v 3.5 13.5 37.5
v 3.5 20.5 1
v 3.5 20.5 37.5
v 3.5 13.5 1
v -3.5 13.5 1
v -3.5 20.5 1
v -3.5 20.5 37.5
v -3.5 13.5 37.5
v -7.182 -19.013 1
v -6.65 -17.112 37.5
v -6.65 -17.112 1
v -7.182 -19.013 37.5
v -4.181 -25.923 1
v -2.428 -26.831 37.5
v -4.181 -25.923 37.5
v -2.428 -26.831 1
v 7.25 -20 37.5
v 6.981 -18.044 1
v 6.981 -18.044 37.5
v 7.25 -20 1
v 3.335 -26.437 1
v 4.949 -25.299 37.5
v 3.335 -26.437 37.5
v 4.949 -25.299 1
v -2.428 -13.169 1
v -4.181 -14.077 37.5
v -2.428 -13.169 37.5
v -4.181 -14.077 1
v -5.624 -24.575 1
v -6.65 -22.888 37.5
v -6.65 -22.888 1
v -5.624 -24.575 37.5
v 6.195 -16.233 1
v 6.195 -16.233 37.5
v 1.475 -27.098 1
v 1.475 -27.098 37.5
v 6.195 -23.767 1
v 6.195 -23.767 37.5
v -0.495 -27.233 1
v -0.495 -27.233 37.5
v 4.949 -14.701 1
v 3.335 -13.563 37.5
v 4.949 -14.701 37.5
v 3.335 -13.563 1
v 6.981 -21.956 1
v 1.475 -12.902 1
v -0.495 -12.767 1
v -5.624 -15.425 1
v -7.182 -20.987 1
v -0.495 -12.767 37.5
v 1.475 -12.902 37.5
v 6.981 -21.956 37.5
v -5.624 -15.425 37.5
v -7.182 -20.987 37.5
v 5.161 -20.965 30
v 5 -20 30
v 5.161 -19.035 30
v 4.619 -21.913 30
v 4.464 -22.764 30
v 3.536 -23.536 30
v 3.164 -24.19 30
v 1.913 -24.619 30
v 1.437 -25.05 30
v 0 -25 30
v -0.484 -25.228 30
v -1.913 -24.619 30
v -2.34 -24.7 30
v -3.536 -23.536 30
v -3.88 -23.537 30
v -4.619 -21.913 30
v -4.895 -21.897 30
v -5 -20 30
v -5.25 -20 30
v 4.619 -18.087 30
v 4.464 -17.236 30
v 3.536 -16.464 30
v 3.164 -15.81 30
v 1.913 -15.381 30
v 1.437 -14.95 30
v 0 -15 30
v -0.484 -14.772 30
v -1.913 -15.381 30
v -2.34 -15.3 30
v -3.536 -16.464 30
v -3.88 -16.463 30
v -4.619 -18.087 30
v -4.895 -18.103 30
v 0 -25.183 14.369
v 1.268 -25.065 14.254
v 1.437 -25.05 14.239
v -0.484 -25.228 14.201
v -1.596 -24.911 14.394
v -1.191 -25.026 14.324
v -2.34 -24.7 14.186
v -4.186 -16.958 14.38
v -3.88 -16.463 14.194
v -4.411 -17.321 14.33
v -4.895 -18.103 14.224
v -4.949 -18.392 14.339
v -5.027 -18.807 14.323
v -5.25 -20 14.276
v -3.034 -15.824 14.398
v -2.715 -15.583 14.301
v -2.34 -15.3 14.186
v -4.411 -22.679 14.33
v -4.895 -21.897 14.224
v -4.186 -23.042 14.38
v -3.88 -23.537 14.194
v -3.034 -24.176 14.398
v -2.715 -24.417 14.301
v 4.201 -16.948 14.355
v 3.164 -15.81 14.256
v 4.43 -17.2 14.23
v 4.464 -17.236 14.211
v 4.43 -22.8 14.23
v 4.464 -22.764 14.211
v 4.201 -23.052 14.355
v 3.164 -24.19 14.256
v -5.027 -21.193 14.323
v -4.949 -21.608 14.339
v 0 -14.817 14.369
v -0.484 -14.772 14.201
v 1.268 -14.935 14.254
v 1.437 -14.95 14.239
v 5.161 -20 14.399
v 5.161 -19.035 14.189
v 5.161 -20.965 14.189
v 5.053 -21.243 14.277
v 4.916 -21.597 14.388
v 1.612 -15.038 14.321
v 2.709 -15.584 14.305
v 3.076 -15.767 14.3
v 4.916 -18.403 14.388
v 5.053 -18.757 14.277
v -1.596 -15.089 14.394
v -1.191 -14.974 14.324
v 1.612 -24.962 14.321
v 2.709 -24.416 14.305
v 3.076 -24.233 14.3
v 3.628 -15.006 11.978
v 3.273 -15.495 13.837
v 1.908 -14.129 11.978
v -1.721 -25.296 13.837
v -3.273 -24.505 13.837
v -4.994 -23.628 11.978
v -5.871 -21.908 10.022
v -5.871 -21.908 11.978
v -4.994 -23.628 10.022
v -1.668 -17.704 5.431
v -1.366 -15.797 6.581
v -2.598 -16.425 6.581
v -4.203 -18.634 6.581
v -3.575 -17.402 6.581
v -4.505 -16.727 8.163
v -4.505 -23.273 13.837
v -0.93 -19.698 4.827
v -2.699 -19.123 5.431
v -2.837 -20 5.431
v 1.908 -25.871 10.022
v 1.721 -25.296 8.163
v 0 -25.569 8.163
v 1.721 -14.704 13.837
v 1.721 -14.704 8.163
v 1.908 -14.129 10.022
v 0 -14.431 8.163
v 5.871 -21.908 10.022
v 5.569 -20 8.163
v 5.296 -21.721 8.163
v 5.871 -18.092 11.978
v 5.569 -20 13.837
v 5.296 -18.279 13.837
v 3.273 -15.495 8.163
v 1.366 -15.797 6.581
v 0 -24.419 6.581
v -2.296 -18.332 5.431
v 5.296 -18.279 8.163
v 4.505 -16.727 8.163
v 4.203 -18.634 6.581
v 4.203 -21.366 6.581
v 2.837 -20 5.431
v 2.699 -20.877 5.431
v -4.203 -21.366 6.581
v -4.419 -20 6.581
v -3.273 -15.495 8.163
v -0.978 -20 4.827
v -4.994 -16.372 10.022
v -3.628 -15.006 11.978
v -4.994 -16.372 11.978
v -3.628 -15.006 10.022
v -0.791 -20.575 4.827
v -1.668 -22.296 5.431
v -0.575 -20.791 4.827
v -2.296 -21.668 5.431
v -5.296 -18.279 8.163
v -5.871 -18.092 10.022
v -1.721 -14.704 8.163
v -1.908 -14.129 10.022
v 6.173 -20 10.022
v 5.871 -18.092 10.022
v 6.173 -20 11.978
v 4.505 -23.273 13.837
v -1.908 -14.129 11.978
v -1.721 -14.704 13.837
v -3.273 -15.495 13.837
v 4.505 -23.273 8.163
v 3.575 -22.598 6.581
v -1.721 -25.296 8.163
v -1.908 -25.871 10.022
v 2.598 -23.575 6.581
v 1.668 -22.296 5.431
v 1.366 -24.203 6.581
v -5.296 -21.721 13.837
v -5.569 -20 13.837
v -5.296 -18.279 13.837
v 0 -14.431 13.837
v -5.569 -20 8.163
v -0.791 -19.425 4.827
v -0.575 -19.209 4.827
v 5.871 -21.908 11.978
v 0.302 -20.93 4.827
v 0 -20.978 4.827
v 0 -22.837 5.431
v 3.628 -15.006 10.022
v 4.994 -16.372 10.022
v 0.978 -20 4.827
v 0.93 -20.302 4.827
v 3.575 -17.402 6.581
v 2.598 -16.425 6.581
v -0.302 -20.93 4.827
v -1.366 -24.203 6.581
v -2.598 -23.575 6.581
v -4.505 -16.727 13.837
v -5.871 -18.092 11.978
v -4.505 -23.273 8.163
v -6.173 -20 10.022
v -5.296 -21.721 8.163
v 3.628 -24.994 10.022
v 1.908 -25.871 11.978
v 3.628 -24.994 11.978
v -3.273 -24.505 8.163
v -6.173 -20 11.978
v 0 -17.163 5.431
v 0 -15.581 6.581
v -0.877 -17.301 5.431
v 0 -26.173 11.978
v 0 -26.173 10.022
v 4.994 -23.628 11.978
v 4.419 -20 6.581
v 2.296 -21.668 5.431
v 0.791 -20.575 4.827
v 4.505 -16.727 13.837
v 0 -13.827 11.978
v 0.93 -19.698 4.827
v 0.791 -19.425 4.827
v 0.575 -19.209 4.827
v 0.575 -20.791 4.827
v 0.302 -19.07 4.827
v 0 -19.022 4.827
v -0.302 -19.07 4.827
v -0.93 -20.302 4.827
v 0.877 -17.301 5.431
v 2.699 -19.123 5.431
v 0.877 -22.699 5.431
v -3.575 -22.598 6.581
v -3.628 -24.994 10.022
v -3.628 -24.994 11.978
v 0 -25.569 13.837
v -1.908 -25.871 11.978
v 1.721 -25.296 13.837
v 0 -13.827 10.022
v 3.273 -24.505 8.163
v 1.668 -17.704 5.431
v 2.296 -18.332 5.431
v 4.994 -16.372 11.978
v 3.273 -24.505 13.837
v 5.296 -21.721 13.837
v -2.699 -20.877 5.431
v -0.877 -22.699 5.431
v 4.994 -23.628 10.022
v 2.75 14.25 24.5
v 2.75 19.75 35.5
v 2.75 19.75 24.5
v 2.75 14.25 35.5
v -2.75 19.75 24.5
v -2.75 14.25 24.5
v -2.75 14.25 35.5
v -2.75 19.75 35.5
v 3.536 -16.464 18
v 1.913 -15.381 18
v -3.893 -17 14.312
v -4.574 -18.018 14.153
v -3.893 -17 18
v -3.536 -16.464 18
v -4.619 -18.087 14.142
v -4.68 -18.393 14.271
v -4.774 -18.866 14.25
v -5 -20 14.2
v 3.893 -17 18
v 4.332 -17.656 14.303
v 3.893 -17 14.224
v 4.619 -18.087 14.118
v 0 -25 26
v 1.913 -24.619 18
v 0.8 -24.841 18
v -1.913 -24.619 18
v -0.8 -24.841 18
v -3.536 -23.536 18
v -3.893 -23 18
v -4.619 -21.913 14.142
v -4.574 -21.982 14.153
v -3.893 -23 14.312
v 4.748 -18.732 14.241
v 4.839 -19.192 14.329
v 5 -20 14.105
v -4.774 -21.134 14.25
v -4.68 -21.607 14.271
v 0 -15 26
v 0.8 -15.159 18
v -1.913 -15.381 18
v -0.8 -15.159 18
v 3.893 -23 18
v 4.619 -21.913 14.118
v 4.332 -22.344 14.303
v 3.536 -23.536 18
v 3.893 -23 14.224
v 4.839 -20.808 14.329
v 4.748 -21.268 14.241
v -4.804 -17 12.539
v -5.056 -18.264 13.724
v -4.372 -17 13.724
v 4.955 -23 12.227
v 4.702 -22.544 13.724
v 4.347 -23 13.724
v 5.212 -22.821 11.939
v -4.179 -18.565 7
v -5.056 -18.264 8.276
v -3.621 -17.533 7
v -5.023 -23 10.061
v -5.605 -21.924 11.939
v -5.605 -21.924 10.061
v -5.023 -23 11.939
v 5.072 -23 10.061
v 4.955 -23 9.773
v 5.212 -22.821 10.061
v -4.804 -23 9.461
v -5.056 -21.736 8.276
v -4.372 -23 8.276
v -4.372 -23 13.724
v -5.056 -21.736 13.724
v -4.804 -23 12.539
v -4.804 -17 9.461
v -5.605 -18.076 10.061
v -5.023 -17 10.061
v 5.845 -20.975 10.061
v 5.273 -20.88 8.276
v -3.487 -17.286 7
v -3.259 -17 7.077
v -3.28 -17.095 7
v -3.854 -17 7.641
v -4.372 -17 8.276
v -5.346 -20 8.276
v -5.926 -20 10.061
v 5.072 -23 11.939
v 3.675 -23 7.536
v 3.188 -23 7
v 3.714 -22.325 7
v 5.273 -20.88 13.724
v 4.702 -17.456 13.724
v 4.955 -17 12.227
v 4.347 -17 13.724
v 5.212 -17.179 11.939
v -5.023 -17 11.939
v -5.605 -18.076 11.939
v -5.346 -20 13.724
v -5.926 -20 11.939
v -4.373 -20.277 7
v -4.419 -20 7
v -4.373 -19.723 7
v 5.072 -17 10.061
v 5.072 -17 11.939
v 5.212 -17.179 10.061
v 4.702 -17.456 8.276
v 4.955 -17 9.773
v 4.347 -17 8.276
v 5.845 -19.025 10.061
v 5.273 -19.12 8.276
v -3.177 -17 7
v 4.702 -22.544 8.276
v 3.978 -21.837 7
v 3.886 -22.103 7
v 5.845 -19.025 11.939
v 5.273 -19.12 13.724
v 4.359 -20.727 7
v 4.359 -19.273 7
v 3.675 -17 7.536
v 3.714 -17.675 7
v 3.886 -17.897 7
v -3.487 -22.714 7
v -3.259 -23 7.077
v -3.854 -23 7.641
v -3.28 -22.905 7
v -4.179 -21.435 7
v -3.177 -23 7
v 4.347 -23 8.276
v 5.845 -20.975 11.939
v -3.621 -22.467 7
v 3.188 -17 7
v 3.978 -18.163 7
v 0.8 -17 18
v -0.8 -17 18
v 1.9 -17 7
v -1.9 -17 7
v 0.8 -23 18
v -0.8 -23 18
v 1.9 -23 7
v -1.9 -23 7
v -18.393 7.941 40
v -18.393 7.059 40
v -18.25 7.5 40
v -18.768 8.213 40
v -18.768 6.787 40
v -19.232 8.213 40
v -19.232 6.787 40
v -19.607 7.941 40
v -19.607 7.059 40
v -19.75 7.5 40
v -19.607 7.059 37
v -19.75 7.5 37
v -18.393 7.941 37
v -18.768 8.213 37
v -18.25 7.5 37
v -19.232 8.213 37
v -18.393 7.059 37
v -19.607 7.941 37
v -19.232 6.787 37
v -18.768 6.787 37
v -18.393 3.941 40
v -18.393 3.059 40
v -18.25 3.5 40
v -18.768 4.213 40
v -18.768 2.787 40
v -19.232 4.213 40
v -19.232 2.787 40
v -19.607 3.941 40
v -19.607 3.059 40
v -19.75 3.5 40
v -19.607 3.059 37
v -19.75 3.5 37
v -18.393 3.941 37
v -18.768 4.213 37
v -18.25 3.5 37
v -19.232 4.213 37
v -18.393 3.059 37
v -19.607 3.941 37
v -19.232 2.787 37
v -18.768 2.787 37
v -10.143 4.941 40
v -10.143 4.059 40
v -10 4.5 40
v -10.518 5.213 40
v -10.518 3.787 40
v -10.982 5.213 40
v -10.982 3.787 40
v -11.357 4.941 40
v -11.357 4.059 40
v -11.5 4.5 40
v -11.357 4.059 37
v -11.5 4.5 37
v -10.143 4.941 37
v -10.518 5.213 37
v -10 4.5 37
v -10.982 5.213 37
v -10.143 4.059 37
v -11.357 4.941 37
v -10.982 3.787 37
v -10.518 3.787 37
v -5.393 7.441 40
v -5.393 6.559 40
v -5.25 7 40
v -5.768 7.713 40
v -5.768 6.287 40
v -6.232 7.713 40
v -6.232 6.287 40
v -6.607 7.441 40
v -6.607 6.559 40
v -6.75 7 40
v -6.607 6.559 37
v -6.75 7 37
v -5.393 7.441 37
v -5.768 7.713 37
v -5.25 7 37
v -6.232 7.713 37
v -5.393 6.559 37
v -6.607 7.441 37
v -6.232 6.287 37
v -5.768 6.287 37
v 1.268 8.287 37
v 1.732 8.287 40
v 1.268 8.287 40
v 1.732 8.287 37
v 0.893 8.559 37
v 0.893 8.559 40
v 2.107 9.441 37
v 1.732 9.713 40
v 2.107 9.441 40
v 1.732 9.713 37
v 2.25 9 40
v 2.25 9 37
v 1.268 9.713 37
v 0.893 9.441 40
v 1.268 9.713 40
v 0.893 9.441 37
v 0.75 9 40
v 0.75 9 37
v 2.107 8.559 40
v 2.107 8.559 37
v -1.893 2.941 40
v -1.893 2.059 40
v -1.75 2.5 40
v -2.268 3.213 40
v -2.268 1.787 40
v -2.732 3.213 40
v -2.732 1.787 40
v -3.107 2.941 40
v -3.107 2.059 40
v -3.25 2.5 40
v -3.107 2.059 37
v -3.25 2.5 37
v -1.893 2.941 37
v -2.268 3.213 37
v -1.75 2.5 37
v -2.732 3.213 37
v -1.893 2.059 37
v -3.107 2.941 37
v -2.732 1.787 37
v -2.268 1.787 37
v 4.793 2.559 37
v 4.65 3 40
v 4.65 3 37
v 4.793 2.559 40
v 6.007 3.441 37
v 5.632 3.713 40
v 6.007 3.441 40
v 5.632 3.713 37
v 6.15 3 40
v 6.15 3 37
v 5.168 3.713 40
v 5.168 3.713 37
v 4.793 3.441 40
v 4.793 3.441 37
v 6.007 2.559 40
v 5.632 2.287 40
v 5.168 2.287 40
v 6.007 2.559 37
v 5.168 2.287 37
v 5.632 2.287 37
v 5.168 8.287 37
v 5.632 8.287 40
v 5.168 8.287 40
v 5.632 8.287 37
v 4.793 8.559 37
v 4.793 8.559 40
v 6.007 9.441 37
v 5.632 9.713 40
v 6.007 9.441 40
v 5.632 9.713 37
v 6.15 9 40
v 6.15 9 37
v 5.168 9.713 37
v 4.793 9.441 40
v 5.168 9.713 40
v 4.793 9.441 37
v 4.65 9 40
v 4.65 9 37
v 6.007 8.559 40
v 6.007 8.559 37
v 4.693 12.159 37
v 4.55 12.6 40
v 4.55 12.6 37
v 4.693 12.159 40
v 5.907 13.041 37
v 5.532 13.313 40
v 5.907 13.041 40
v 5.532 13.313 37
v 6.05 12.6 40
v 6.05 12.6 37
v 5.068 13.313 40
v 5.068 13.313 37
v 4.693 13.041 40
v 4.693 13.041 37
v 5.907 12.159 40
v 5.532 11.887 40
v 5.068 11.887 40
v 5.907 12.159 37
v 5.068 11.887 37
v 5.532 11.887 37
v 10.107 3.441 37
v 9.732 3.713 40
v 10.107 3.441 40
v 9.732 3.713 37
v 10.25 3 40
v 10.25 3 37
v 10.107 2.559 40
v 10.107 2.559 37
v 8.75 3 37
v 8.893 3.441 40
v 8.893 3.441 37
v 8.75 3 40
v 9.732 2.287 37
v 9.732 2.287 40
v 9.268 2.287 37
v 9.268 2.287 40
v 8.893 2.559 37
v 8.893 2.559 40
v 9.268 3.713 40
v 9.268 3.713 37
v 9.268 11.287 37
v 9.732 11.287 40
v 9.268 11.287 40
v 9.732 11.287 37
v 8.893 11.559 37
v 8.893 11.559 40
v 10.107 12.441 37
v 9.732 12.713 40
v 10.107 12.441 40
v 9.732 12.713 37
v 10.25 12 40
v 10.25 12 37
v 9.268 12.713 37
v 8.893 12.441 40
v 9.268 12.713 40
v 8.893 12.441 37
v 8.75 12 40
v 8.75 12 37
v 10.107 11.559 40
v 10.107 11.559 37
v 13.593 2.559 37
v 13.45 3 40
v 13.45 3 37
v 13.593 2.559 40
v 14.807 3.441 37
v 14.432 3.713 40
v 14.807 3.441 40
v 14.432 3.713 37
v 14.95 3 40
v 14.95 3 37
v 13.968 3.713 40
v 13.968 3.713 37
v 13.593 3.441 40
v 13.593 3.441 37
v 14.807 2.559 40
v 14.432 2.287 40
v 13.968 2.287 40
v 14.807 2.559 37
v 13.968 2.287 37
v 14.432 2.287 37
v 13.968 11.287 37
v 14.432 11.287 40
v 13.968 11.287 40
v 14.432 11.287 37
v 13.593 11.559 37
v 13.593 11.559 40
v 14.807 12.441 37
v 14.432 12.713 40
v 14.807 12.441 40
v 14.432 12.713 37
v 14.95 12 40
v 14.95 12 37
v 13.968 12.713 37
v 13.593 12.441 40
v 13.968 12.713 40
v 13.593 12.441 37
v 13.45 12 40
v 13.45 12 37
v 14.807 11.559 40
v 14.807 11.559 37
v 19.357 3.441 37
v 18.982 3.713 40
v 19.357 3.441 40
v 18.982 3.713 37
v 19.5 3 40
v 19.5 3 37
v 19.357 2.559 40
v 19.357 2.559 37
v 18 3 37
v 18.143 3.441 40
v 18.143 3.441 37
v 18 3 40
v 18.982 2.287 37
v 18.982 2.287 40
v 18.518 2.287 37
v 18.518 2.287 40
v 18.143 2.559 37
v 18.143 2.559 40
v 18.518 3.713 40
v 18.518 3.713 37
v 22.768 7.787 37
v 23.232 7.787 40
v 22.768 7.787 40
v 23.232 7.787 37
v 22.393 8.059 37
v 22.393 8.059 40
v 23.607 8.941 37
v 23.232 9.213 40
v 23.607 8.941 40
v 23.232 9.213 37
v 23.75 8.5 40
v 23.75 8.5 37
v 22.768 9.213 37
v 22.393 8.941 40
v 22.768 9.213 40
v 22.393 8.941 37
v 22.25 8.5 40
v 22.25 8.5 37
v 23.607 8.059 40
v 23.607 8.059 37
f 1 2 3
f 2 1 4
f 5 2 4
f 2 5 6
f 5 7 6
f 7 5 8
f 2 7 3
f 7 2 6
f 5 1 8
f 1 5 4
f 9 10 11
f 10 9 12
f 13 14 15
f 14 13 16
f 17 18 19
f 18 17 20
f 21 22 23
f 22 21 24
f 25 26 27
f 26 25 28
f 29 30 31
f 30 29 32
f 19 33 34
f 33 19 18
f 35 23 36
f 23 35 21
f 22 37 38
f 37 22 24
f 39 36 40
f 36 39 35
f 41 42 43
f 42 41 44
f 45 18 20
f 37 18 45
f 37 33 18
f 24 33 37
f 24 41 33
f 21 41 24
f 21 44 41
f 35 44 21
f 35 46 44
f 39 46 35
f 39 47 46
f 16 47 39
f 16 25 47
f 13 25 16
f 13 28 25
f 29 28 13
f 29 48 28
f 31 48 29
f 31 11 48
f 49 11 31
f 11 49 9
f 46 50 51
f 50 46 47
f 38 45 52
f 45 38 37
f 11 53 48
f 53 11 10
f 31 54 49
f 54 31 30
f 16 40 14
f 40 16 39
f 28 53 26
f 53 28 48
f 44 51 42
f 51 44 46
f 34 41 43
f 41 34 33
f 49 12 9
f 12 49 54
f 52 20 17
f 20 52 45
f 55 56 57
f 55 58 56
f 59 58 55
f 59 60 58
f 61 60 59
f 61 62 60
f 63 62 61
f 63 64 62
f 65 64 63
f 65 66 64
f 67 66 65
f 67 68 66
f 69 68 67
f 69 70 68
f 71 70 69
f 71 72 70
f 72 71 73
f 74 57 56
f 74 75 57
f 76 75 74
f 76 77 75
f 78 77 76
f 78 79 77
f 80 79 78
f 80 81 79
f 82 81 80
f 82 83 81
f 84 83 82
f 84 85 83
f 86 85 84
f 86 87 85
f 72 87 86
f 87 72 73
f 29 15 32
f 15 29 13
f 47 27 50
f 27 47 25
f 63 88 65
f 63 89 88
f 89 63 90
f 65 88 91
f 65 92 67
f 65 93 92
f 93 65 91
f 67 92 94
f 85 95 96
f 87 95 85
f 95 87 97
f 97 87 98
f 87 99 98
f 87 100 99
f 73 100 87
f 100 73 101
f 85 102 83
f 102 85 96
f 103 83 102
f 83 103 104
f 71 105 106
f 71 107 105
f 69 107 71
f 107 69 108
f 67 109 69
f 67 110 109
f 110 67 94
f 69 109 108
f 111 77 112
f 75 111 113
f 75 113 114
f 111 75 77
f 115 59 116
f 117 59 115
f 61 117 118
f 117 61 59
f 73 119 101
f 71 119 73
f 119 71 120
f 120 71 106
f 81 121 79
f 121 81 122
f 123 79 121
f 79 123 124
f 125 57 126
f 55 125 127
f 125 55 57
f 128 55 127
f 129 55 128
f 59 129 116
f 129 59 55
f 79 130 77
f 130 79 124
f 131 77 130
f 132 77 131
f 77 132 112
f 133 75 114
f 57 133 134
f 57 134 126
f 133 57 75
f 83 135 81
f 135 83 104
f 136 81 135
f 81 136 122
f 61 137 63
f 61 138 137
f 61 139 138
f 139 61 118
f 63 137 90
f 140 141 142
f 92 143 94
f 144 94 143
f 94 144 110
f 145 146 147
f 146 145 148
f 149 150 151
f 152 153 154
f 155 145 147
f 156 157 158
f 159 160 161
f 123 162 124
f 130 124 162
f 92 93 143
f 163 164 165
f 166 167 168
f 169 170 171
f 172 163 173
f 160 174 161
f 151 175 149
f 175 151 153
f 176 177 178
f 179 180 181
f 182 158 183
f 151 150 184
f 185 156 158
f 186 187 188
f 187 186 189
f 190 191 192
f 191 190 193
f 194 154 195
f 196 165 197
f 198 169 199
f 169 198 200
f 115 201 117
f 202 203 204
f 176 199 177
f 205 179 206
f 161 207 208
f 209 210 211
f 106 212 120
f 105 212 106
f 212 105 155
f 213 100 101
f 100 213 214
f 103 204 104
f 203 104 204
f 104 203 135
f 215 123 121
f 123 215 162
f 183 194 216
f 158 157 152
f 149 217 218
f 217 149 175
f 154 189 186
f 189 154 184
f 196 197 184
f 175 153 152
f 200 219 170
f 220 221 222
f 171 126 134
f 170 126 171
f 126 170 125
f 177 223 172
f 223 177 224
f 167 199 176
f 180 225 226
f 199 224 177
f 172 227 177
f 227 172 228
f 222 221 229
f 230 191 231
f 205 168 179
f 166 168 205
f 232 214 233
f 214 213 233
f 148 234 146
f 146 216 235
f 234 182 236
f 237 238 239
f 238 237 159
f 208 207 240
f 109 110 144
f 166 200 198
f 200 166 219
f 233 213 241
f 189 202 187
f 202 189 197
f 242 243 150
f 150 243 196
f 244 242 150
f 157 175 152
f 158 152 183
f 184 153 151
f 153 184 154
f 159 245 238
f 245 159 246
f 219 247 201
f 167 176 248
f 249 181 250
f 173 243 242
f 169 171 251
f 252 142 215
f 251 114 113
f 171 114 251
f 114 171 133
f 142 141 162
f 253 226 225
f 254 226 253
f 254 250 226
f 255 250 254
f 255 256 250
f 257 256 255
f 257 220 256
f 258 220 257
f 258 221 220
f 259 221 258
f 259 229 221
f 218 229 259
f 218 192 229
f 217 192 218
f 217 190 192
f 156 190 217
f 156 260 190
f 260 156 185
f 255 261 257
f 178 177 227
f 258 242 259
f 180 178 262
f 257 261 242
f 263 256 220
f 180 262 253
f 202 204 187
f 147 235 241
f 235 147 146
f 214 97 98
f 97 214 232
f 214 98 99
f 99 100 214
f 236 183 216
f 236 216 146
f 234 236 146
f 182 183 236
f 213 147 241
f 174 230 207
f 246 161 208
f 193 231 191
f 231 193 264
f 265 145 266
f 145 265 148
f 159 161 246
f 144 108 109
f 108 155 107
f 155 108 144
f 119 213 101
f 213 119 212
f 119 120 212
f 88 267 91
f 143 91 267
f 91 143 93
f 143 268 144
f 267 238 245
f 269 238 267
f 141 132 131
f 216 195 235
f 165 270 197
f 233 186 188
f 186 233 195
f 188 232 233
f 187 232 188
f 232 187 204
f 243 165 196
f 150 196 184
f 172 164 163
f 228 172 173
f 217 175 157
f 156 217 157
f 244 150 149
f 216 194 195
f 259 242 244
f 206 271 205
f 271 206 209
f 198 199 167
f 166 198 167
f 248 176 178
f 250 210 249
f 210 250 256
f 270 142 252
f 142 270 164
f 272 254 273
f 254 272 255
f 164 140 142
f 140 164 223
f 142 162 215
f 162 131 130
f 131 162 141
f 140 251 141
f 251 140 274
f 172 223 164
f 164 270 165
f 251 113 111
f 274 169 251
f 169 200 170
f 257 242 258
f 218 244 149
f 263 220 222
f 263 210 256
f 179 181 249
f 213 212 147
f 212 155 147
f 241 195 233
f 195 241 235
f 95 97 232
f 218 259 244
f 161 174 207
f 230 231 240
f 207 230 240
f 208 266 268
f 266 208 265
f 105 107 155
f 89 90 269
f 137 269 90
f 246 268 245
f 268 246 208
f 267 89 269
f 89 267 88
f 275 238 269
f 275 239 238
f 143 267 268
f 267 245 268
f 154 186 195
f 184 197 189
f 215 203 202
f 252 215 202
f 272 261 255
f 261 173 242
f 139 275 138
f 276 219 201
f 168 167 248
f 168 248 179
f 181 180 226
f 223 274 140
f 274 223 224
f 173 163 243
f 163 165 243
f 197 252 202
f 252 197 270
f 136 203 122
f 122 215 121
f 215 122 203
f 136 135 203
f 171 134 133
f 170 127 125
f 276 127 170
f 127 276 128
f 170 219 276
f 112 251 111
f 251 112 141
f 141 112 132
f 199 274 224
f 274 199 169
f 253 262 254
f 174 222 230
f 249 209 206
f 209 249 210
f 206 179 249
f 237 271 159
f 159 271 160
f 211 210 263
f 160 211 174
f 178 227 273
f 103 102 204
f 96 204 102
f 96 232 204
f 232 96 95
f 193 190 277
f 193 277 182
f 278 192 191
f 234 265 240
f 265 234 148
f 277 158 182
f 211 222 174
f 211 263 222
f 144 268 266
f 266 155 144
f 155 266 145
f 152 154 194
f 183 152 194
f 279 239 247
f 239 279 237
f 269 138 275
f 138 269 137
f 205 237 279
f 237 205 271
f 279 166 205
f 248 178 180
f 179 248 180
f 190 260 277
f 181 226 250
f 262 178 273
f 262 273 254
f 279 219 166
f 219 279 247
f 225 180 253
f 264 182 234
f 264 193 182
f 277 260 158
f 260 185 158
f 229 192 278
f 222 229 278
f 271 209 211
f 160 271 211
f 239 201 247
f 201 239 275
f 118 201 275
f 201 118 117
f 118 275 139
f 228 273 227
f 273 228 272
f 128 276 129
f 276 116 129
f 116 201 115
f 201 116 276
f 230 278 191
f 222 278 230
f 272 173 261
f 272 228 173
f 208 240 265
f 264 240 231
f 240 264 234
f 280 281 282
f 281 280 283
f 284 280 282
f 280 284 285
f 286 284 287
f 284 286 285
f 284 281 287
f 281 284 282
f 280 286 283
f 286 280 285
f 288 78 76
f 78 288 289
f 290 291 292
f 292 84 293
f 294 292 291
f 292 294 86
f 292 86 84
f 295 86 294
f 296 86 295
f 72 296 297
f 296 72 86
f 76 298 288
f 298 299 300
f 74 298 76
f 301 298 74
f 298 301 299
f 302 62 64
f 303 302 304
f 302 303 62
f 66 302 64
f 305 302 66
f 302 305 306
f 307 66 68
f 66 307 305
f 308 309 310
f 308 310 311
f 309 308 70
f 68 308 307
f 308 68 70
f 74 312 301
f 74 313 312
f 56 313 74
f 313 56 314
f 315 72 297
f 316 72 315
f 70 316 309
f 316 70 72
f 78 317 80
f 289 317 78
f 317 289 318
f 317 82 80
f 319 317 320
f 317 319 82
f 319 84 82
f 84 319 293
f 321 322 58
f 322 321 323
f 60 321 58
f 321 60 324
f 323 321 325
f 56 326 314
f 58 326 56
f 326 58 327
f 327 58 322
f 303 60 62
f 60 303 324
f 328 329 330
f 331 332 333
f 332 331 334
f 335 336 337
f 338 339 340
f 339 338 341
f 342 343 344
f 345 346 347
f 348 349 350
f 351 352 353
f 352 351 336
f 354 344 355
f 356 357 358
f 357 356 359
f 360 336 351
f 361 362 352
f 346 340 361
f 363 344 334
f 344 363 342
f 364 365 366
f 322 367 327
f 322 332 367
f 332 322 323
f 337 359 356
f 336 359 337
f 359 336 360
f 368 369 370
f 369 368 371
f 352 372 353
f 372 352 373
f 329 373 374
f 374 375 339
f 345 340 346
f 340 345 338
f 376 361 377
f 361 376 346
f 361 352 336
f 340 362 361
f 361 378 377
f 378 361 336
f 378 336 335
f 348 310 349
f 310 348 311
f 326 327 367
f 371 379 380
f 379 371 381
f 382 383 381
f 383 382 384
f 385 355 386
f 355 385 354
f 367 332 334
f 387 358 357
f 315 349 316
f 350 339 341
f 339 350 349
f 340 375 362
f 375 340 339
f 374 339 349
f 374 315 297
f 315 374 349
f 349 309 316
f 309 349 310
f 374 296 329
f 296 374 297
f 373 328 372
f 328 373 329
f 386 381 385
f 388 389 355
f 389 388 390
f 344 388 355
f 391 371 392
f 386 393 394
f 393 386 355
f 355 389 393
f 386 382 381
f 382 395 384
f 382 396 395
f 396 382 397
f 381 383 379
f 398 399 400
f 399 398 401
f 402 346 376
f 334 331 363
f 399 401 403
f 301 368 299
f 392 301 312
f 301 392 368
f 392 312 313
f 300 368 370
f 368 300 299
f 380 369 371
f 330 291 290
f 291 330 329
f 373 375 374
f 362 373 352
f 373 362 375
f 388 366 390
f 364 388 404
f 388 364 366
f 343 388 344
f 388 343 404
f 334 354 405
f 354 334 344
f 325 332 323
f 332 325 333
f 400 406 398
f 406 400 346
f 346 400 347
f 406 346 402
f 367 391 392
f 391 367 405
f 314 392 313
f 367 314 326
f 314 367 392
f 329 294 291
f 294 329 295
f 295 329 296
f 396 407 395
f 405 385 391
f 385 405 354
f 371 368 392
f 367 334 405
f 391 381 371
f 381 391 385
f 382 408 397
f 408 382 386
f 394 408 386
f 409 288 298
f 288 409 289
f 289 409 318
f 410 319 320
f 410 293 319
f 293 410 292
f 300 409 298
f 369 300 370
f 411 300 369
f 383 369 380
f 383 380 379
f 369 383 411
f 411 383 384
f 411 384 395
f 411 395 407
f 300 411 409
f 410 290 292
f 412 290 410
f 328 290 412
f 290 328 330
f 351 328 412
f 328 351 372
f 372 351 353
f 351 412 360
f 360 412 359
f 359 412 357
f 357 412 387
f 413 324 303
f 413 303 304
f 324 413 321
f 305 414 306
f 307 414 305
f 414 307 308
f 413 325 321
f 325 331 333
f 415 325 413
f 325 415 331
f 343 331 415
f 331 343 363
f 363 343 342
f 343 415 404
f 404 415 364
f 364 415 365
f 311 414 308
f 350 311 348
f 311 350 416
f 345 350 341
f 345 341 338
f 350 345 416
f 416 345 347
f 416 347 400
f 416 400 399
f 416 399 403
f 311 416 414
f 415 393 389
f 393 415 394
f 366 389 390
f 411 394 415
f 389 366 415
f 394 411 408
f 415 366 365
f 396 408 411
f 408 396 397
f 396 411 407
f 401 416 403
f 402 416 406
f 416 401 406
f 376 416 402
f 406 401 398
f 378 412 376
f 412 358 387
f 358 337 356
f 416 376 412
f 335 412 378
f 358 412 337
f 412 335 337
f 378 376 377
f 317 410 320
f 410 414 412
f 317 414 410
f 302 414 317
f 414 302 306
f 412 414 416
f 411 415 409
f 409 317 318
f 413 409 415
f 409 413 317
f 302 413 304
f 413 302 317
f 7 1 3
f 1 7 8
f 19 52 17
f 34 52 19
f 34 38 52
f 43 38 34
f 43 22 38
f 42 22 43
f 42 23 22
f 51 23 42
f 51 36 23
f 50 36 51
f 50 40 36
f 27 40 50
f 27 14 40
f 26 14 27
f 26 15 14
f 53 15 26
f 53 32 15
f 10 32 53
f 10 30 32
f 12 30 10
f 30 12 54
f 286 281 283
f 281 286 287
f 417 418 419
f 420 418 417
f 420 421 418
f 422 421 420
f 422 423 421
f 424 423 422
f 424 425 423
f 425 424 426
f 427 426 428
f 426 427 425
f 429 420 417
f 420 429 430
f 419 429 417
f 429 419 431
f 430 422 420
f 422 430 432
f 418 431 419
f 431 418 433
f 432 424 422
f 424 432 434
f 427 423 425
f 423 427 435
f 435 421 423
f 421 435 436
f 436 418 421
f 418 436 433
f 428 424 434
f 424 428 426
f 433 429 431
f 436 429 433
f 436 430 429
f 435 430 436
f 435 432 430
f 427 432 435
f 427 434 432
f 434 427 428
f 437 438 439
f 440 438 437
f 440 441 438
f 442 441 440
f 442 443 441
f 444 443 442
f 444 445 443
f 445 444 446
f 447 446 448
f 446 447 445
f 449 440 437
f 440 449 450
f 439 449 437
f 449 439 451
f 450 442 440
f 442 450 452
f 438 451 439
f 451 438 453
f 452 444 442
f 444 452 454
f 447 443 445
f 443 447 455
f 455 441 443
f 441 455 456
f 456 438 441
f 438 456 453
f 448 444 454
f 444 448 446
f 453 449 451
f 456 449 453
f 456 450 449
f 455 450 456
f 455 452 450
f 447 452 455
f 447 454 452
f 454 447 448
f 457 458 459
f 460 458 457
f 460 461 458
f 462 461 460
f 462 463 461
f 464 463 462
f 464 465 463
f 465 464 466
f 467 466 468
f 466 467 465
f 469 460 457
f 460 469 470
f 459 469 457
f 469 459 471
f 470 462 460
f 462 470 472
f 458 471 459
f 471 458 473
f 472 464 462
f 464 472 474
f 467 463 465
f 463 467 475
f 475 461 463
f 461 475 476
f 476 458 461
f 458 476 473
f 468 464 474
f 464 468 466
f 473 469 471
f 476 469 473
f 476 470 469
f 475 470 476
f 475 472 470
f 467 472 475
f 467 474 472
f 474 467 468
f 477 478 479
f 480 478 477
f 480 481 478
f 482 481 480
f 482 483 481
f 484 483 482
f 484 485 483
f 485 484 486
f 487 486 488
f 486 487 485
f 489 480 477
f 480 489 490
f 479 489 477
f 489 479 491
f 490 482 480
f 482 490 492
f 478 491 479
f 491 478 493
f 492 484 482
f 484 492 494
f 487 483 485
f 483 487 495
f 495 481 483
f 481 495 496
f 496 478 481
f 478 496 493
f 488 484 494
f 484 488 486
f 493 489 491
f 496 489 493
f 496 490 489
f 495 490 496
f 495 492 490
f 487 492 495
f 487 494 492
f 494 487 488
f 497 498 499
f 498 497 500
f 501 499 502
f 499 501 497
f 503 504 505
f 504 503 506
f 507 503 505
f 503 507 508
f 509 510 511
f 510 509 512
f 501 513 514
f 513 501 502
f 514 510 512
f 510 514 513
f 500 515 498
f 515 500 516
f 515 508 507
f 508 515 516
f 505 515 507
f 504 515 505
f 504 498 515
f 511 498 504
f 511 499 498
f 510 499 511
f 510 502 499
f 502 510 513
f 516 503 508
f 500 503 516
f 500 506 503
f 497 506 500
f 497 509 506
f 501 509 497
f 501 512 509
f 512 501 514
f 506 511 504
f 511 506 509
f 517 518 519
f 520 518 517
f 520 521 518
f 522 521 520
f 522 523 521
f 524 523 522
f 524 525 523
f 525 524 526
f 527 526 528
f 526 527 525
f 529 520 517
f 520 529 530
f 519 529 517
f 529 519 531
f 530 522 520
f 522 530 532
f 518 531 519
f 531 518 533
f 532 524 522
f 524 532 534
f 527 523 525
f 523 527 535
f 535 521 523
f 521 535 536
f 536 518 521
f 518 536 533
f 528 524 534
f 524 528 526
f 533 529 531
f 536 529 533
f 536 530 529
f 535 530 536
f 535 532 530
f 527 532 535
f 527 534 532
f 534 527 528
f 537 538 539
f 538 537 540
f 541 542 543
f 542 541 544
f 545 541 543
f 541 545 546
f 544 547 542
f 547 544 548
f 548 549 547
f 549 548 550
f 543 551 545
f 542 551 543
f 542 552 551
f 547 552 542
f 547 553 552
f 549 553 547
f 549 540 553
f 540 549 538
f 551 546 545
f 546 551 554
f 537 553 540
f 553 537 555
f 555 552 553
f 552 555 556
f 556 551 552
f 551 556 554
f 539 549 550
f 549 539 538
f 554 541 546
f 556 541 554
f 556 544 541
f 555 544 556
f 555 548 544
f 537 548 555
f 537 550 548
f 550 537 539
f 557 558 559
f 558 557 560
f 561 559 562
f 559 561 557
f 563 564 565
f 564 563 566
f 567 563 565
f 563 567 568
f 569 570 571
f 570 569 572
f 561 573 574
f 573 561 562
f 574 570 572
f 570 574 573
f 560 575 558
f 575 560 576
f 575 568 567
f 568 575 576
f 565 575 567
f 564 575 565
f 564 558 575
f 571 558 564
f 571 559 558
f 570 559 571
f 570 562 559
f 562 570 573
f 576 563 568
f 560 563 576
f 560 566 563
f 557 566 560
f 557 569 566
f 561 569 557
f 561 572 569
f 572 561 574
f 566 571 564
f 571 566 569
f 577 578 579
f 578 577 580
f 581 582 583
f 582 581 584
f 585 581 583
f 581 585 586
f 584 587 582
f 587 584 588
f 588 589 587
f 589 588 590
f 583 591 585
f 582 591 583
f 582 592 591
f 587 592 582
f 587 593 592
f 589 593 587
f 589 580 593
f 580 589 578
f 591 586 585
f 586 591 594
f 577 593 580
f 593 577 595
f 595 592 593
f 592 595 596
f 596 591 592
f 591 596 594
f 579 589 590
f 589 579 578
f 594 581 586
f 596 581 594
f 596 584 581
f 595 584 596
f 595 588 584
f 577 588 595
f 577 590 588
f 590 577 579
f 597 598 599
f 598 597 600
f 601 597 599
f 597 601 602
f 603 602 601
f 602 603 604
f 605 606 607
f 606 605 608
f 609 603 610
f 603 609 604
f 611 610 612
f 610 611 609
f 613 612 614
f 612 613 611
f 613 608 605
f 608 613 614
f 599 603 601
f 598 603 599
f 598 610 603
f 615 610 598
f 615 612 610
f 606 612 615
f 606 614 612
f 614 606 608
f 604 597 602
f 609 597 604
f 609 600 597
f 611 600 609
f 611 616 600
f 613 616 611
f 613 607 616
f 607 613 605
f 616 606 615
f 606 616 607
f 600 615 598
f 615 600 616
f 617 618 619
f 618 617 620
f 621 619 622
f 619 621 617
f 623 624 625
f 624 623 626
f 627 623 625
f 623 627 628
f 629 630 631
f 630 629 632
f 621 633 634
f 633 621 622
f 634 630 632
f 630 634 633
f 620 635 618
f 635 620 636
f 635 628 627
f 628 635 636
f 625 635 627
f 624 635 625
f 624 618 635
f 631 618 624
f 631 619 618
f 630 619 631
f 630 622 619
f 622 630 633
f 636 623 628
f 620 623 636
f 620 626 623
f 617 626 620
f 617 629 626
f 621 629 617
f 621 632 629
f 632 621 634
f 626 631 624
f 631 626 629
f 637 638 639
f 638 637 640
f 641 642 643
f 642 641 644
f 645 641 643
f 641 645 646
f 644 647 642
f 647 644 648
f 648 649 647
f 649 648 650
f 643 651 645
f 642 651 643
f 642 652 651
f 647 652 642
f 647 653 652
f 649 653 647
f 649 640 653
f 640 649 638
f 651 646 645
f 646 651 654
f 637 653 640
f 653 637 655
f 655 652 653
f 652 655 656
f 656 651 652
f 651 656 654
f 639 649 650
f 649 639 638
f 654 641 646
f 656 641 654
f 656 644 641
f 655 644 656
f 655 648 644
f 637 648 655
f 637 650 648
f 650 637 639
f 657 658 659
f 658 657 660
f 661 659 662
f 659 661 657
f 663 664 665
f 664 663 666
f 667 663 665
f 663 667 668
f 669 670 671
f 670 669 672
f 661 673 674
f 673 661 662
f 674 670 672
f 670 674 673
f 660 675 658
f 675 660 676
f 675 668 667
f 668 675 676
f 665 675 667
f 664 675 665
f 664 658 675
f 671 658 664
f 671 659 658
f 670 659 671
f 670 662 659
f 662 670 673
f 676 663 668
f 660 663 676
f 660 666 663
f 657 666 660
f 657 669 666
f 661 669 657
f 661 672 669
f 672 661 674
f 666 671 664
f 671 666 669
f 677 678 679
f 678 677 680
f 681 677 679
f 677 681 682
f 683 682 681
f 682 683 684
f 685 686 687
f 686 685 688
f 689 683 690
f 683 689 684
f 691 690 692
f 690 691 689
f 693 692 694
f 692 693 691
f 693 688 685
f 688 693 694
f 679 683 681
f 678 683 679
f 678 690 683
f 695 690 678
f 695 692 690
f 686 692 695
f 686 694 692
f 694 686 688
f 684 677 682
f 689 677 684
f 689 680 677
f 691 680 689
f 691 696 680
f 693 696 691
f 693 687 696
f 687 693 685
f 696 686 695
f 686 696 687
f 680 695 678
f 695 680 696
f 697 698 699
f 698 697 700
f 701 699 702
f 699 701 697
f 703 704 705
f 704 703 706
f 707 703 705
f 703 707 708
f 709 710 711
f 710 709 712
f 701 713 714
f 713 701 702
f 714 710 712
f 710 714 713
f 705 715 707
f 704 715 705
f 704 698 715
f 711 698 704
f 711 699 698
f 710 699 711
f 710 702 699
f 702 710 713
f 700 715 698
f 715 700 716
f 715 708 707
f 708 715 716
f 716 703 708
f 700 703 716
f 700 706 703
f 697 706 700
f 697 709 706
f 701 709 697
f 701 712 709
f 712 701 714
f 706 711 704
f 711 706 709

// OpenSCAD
// file: snaps.scad
module pinshape(r=5,bellend=6,h=20) {
	union() {
		cylinder(r=r,h=h);
		translate([0,0,h]) sphere(r = bellend);
		}
}


module pin (h=20) {
	difference () {
		pinshape(h=h);
		translate([-10,3,h-7]) cube([20,10,30]);
		translate([-10,-13,h-7]) cube([20,10,30]);
		translate([-10,-10,h+4]) cube([20,20,10]);
		translate([0,10,6]) rotate([90, 0, 0]) linear_extrude(height=20) polygon(points=[[0,0],[-10,100],[10,100]],paths=[ [0,1,2] ]);
	}
}

module pinhole (h=20) {
		pinshape(r=5.25,bellend=6.25,h=h);
}

union () {
	translate([0,0,1]) pin(h=21);
	translate([-7.5,-7.5,0]) cube([15,15,2]);
}

/*
translate([18,0,27.25]) rotate([0,180,0]) difference () {
	cylinder(r=7.25, h=27.27);
	translate([0,0,-1]) pinhole();
}
*/
// main file
use <snaps.scad>

module _pegs(r=0.75) {
	translate([-19,0,0]) cylinder(h=3,r=r, $fn=10);
	translate([-19,-4,0]) cylinder(h=3,r=r, $fn=10);
	translate([-10.75,-3,0]) cylinder(h=3,r=r, $fn=10);
	translate([-6,-0.5,0]) cylinder(h=3,r=r, $fn=10);
	translate([1.5,1.5,0]) cylinder(h=3,r=r, $fn=10);
	translate([-2.5,-5,0]) cylinder(h=3,r=r, $fn=10);
	translate([5.4,-4.5,0]) cylinder(h=3,r=r, $fn=10);
	translate([5.4,1.5,0]) cylinder(h=3,r=r, $fn=10);
	translate([5.3,5.1,0]) cylinder(h=3,r=r, $fn=10);
	translate([9.5,-4.5,0]) cylinder(h=3,r=r, $fn=10);
	translate([9.5,4.5,0]) cylinder(h=3,r=r, $fn=10);
	translate([14.2,-4.5,0]) cylinder(h=3,r=r, $fn=10);
	translate([14.2,4.5,0]) cylinder(h=3,r=r, $fn=10);
	translate([18.75,-4.5,0]) cylinder(h=3,r=r, $fn=10);
	translate([23,1,0]) cylinder(h=3,r=r, $fn=10);
}

module mozilla(h=4, pegs=true) {
	width = 50;
	height = 13;
	union () {
		color("white") translate([width/-2,height/-2,0]) linear_extrude(height = h, convexity = 10)
		resize(newsize=[width,height,0])
		import (file = "mozilla.dxf");
		if (pegs) {
			translate([0,0,-1])  _pegs();
		}
	}
}

module heart(width=70.25, height=58.25, depth=15) {
	linear_extrude(height = depth, convexity = 10)
	translate([width/-2, height/-2, 0]) resize(newsize=[width,height,0])
	import (file = "heart.dxf");
}

module heart_inset(width=65.775, height=53.581, depth=15) {
	linear_extrude(height = depth, convexity = 10)
	translate([width/-2, height/-2, 0]) resize(newsize=[width,height,0])
	import (file = "heart_inset.dxf");
}

module top_lid(pegs=true) {
	color ("red") difference () {
		union () {
			difference () {
				heart(depth=8);
				translate([0, 0, -0.5]) heart_inset(depth=6.5);
				if (pegs) {
					translate([0, 7.5, 7]) _pegs(r=1.1);
				} else {
					translate([0, 7.5, 7]) mozilla(pegs=false);
				}
			}
			//translate([0,-21.5,0]) pinplace();
			translate([-3.5, 13.5, 0]) cube([7,7,7.5]);
			translate([0,-20,2]) rotate([0,180,0]) pin(h=21);
			translate([0,-20,0]) cylinder(r=7.25, h=7.5);
		}
		translate([-2.75,14.25,-0.5]) cube([5.5,5.5,6]);
	}
}

module box_body() {
	color ("red") difference () {
		union () {
			difference () {
				heart(depth=30);
				translate([0, 0, 3]) heart_inset(depth=30);
			}
			translate([-3.5, 13.5, 1]) cube([7,7,29]);
			translate([0,-20,1]) cylinder(r=7.25, h=29);

		}
		translate([-2.75,14.25,24.5]) cube([5.5,5.5,6]);
		translate([0, -20, 31]) rotate([0,180,0]) pinhole();
	}
}

box_body();
translate([0,0,30]) top_lid();
translate([0, 7.5, 38]) mozilla(height=3);
